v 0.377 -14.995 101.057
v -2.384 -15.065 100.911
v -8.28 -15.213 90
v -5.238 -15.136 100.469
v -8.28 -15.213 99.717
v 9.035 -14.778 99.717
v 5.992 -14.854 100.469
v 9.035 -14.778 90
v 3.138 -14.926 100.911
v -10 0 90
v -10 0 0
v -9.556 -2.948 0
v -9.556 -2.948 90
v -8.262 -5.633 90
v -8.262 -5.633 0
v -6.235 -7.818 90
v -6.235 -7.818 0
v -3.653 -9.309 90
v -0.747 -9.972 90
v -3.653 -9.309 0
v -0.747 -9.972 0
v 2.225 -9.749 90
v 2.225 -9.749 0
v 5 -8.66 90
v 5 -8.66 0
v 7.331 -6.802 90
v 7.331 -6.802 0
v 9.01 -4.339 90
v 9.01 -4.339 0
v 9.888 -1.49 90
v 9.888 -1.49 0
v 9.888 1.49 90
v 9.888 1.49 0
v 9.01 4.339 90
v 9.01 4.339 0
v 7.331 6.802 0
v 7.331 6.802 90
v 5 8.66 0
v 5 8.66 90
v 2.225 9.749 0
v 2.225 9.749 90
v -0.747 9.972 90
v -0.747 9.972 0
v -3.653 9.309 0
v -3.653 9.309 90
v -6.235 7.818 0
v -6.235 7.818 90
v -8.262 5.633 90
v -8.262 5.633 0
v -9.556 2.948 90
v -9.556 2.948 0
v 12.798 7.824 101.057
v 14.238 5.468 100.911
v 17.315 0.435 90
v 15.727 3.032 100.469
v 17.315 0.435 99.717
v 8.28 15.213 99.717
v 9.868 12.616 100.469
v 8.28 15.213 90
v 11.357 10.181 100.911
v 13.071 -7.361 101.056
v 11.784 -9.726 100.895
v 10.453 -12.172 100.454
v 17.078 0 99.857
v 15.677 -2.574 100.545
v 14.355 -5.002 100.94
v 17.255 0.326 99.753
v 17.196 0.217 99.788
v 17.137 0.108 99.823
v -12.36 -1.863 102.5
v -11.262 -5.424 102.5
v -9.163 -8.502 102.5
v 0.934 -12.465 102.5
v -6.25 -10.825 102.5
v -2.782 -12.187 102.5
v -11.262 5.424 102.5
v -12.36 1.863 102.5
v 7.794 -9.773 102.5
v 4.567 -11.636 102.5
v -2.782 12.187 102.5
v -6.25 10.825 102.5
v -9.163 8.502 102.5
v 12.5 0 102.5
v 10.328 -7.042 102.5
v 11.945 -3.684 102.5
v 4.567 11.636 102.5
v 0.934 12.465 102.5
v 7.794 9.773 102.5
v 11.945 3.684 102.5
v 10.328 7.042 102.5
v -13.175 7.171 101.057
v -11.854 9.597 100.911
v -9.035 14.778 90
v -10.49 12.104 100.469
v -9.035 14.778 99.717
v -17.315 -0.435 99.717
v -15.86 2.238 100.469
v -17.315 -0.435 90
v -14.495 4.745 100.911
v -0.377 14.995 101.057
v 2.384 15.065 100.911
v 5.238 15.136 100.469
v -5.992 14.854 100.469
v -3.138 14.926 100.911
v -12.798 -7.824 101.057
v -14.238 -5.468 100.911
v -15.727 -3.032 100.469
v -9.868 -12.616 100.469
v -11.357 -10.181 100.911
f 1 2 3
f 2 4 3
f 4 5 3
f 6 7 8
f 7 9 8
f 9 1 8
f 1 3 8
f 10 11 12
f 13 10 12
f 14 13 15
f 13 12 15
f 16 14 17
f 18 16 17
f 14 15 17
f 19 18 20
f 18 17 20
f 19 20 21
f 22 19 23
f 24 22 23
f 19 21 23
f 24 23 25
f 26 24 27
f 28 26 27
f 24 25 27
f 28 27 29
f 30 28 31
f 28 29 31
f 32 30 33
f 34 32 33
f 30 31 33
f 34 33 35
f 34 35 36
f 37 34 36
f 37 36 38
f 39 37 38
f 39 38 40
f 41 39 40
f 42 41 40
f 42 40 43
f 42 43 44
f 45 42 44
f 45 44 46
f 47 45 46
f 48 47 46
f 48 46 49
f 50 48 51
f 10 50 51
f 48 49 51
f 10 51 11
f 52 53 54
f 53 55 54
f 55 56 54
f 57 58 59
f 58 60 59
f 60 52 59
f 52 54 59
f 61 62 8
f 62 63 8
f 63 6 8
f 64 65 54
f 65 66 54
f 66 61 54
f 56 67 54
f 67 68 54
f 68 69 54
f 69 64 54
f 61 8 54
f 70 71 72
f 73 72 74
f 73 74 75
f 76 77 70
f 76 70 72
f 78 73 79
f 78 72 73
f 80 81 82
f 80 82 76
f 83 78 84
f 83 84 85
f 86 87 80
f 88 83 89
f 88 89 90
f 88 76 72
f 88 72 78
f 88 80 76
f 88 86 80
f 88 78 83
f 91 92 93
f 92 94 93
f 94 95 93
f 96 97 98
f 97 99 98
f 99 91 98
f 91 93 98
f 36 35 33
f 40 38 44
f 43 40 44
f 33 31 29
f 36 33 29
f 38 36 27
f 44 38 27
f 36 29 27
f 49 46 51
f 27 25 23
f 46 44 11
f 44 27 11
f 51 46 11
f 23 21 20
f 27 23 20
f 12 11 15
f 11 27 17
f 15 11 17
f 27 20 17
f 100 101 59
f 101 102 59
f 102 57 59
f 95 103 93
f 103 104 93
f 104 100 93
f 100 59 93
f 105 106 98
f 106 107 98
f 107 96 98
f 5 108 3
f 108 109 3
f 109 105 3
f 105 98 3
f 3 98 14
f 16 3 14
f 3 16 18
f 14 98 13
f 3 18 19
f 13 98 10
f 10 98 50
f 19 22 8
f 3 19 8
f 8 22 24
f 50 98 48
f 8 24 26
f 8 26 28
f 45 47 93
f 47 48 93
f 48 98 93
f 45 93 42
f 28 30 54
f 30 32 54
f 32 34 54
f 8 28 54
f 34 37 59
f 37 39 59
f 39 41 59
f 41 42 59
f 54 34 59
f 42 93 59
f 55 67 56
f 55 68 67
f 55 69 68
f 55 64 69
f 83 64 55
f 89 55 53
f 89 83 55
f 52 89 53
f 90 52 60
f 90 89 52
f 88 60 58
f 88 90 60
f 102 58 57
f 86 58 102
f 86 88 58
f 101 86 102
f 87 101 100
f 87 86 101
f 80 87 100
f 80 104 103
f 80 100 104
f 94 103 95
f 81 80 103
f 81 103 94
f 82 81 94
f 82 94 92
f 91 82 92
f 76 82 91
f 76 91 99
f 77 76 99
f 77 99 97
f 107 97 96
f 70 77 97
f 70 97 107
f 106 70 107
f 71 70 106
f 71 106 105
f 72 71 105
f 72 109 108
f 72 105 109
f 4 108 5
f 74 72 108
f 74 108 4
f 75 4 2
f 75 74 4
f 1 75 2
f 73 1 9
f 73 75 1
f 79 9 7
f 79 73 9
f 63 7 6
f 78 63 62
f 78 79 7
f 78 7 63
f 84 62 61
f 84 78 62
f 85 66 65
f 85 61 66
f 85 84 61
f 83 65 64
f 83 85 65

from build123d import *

# Parameters (mm, degrees)
SKETCH1_R           = 10
BOSS_EXTRUDE1_DEPTH = 90
BOSS_EXTRUDE2_DEPTH = 12.5
SKETCH4_OUTSIDE_W   = 76.428
SKETCH4_OUTSIDE_H   = 72.224
SKETCH4_OUTSIDE_R   = 12.5
CUT_EXTRUDE2_DEPTH  = 5
CUT_EXTRUDE2_DRAFT  = -60


with BuildPart() as part:
    # Sketch1 → Boss-Extrude1 (new body)
    with BuildSketch(Plane.XY):
        with Locations(Location((0, 0, 0), (0, 0, 180))):
            Circle(SKETCH1_R)
    extrude(amount=BOSS_EXTRUDE1_DEPTH)

    # Sketch3 → Boss-Extrude2 (add)
    with BuildSketch(Plane.XY.offset(90)):
        Polygon((8.280492797, 15.212936569), (-9.034543136, 14.777585402), (-17.315035933, -0.435351166), (-8.280492797, -15.212936569), (9.034543136, -14.777585402), (17.315035933, 0.435351166), align=None)
    extrude(amount=BOSS_EXTRUDE2_DEPTH)


with BuildPart() as cut_extrude2_tool:
    # Sketch4 outside → Cut-Extrude2 (with draft: the straight prism first)
    with BuildSketch(Plane.XY.offset(102.5)):
        Rectangle(SKETCH4_OUTSIDE_W, SKETCH4_OUTSIDE_H)
        Circle(SKETCH4_OUTSIDE_R, mode=Mode.SUBTRACT)
    extrude(amount=-CUT_EXTRUDE2_DEPTH)
    # Cut-Extrude2: the draft: its side faces are tilted about the plane it starts from
    cut_extrude2_sides = [cut_extrude2_tool.faces().sort_by_distance(p)[0] for p in [
        (0, -36.112, 100),
        (38.214, 0, 100),
        (0, 36.112, 100),
        (-38.214, 0, 100),
        (-12.5, 0, 100),
    ]]
    draft(cut_extrude2_sides, Plane.XY.offset(102.5), CUT_EXTRUDE2_DRAFT)


with BuildPart() as part_1:
    add(part.part)

    # Cut-Extrude2: cut by cut_extrude2_tool
    add(cut_extrude2_tool.part, mode=Mode.SUBTRACT)


solid = part_1.part
